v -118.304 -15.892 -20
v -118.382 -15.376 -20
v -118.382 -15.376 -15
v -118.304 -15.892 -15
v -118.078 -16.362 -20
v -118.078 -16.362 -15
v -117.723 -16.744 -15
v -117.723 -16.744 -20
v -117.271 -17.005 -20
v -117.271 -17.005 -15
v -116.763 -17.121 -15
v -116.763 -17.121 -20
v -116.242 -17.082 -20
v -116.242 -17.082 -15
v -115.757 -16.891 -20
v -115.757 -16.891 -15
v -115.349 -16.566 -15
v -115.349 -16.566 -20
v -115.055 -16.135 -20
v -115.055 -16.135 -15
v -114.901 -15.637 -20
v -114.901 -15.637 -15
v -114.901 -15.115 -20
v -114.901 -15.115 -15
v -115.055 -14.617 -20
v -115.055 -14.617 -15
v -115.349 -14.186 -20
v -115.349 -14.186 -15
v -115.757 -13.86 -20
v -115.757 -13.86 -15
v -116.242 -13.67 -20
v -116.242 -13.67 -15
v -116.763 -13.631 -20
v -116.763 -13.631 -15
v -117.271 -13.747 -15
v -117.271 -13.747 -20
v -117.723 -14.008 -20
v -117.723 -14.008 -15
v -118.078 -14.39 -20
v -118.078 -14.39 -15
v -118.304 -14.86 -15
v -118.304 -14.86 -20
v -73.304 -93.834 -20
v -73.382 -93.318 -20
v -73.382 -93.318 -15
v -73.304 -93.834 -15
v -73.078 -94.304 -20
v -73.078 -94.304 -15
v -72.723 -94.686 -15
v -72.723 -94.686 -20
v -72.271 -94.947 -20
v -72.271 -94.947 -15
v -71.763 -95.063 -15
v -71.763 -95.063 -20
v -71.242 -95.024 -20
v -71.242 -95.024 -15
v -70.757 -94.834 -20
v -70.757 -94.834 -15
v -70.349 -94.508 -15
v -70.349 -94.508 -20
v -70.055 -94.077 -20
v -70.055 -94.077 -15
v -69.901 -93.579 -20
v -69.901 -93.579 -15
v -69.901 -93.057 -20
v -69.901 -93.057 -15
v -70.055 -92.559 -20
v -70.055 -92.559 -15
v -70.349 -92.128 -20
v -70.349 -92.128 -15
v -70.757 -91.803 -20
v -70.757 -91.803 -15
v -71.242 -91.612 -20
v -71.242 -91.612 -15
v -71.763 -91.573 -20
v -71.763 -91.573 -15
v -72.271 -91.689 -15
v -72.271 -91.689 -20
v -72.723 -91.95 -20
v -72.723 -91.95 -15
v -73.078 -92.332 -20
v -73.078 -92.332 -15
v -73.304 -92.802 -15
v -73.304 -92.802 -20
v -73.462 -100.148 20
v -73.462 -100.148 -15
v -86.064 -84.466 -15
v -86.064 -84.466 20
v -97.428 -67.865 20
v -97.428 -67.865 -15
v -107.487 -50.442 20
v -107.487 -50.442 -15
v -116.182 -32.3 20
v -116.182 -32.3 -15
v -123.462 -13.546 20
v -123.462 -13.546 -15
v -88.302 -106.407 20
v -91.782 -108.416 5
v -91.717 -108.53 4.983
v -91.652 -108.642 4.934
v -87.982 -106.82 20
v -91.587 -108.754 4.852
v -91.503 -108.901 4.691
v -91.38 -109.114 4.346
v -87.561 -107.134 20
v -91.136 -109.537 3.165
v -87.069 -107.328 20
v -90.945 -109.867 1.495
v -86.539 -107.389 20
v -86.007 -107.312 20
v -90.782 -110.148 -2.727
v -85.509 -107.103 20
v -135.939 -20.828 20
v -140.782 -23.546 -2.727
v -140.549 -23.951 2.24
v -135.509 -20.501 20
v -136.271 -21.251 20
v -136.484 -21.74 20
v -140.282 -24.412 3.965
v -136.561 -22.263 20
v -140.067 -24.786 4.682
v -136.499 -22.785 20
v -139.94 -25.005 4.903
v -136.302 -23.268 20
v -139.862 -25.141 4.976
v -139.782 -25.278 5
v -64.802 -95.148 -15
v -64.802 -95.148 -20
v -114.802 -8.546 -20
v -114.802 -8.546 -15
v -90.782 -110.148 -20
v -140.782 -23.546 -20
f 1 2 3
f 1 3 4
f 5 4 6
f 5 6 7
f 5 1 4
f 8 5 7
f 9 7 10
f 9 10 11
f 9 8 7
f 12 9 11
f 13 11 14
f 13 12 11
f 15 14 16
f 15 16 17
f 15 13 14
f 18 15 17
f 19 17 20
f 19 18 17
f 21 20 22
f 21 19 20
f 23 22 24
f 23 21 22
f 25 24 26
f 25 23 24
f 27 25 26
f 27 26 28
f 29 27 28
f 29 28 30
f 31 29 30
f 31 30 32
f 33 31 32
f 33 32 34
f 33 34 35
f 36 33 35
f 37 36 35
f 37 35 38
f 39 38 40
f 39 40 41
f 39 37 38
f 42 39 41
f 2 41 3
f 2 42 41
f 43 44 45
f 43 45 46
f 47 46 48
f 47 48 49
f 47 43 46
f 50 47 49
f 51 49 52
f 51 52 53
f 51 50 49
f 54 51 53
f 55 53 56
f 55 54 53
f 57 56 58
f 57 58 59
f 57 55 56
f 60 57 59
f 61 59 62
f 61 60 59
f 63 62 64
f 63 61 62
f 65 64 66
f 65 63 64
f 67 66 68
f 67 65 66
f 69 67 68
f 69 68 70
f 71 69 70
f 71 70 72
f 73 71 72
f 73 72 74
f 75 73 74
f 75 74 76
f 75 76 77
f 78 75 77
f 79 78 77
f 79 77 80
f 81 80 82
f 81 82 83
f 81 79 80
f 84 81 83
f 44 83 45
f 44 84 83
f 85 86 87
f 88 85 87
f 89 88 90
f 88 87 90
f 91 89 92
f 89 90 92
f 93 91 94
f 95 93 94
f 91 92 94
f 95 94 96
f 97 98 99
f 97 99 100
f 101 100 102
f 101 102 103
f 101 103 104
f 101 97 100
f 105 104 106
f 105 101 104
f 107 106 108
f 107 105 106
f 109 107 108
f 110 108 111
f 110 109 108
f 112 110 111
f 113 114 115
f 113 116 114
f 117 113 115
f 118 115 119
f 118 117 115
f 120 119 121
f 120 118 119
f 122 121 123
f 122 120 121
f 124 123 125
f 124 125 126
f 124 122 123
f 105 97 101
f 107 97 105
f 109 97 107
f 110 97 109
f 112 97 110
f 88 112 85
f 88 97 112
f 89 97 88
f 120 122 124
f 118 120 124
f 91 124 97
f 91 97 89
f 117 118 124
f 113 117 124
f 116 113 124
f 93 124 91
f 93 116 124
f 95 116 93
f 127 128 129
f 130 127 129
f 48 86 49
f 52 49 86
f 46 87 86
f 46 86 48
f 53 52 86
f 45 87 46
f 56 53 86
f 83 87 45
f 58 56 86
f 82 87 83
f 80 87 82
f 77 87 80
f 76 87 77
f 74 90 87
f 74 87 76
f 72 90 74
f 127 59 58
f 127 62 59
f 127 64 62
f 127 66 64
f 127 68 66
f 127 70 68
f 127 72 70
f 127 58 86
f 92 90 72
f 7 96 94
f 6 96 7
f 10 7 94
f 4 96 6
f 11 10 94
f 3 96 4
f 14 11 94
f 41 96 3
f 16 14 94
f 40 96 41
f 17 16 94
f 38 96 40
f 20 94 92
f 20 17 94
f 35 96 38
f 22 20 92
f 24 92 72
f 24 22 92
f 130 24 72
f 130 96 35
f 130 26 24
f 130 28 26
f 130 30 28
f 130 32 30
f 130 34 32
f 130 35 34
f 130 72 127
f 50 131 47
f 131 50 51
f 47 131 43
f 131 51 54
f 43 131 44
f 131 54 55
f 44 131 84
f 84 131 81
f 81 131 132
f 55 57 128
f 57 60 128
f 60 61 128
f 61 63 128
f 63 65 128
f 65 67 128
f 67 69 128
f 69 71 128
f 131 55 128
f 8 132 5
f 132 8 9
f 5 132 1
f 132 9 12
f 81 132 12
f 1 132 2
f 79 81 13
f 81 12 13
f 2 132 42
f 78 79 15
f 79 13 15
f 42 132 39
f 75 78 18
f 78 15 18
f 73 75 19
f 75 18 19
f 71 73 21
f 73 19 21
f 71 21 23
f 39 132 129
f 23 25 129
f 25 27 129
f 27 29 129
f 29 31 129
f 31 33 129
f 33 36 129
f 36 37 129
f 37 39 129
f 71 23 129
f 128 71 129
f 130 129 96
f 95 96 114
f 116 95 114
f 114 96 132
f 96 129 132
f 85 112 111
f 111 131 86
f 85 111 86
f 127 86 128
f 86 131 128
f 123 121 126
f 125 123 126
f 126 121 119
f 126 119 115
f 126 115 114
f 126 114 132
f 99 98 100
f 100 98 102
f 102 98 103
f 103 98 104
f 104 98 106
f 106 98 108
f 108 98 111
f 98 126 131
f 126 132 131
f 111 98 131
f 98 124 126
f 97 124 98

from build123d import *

# Parameters (mm, degrees)
BOSS_EXTRUDE1_DEPTH      = 20
BOSS_EXTRUDE1_DEPTH_BACK = 15
BOSS_EXTRUDE2_START      = -20
SKETCH1_3_R              = 1.75
BOSS_EXTRUDE2_DEPTH      = 5
CHAMFER1_SIZE            = 15
CHAMFER1_SIZE2           = 4.019237886
FILLET1_R                = 2


with BuildPart() as part:
    # Sketch1 → Boss-Extrude1 (new, two sides: drawn at the far end of the back side and taken through both)
    with BuildSketch(Plane.XY.offset(-BOSS_EXTRUDE1_DEPTH_BACK)):
        with BuildLine():
            ThreePointArc((-73.461980247, -100.14832099), (-102.624010348, -59.25), (-123.461980247, -13.545780611))
            Line((-123.461980247, -13.545780611), (-140.782488323, -23.545780611))
            Line((-140.782488323, -23.545780611), (-90.782488323, -110.14832099))
            Line((-90.782488323, -110.14832099), (-73.461980247, -100.14832099))
        make_face()
    extrude(amount=BOSS_EXTRUDE1_DEPTH + BOSS_EXTRUDE1_DEPTH_BACK)

    # Sketch1<3> → Boss-Extrude2 (add)
    # profile 1 of 2: a face of its own
    with BuildSketch(Plane.XY.offset(BOSS_EXTRUDE2_START)):
        with BuildLine():
            ThreePointArc((-73.461980247, -100.14832099), (-102.624010348, -59.25), (-123.461980247, -13.545780611))
            Line((-123.461980247, -13.545780611), (-140.782488323, -23.545780611))
            Line((-140.782488323, -23.545780611), (-90.782488323, -110.14832099))
            Line((-90.782488323, -110.14832099), (-73.461980247, -100.14832099))
        make_face()
    # profile 2 of 2: a face of its own
    with BuildSketch(Plane.XY.offset(BOSS_EXTRUDE2_START)):
        with BuildLine():
            Line((-114.801726209, -8.545780611), (-123.461980247, -13.545780611))
            ThreePointArc((-123.461980247, -13.545780611), (-102.624010348, -59.25), (-73.461980247, -100.14832099))
            Line((-73.461980247, -100.14832099), (-64.801726209, -95.14832099))
            Line((-64.801726209, -95.14832099), (-114.801726209, -8.545780611))
        make_face()
        with Locations(Location((-71.631853228, -93.318193971, 0), (0, 0, 180))):
            Circle(SKETCH1_3_R, mode=Mode.SUBTRACT)
        with Locations(Location((-116.631853228, -15.37590763, 0), (0, 0, 180))):
            Circle(SKETCH1_3_R, mode=Mode.SUBTRACT)
    extrude(amount=BOSS_EXTRUDE2_DEPTH)

    # Chamfer1
    chamfer1_edges = [part.edges().sort_by_distance(p)[0] for p in [
        (-115.782488323, -66.847050801, 20),
    ]]
    chamfer1_side = [part.faces().sort_by_distance(p)[0] for p in [
        (-115.782488323, -66.847050801, 0),
    ]]
    chamfer(chamfer1_edges, length=CHAMFER1_SIZE, length2=CHAMFER1_SIZE2, reference=chamfer1_side[0])

    # Fillet1
    fillet1_edges = [part.edges().sort_by_distance(p)[0] for p in [
        (-89.042107266, -109.143511518, 12.5),
        (-139.042107266, -22.54097114, 12.5),
    ]]
    fillet(fillet1_edges, radius=FILLET1_R)


solid = part.part
